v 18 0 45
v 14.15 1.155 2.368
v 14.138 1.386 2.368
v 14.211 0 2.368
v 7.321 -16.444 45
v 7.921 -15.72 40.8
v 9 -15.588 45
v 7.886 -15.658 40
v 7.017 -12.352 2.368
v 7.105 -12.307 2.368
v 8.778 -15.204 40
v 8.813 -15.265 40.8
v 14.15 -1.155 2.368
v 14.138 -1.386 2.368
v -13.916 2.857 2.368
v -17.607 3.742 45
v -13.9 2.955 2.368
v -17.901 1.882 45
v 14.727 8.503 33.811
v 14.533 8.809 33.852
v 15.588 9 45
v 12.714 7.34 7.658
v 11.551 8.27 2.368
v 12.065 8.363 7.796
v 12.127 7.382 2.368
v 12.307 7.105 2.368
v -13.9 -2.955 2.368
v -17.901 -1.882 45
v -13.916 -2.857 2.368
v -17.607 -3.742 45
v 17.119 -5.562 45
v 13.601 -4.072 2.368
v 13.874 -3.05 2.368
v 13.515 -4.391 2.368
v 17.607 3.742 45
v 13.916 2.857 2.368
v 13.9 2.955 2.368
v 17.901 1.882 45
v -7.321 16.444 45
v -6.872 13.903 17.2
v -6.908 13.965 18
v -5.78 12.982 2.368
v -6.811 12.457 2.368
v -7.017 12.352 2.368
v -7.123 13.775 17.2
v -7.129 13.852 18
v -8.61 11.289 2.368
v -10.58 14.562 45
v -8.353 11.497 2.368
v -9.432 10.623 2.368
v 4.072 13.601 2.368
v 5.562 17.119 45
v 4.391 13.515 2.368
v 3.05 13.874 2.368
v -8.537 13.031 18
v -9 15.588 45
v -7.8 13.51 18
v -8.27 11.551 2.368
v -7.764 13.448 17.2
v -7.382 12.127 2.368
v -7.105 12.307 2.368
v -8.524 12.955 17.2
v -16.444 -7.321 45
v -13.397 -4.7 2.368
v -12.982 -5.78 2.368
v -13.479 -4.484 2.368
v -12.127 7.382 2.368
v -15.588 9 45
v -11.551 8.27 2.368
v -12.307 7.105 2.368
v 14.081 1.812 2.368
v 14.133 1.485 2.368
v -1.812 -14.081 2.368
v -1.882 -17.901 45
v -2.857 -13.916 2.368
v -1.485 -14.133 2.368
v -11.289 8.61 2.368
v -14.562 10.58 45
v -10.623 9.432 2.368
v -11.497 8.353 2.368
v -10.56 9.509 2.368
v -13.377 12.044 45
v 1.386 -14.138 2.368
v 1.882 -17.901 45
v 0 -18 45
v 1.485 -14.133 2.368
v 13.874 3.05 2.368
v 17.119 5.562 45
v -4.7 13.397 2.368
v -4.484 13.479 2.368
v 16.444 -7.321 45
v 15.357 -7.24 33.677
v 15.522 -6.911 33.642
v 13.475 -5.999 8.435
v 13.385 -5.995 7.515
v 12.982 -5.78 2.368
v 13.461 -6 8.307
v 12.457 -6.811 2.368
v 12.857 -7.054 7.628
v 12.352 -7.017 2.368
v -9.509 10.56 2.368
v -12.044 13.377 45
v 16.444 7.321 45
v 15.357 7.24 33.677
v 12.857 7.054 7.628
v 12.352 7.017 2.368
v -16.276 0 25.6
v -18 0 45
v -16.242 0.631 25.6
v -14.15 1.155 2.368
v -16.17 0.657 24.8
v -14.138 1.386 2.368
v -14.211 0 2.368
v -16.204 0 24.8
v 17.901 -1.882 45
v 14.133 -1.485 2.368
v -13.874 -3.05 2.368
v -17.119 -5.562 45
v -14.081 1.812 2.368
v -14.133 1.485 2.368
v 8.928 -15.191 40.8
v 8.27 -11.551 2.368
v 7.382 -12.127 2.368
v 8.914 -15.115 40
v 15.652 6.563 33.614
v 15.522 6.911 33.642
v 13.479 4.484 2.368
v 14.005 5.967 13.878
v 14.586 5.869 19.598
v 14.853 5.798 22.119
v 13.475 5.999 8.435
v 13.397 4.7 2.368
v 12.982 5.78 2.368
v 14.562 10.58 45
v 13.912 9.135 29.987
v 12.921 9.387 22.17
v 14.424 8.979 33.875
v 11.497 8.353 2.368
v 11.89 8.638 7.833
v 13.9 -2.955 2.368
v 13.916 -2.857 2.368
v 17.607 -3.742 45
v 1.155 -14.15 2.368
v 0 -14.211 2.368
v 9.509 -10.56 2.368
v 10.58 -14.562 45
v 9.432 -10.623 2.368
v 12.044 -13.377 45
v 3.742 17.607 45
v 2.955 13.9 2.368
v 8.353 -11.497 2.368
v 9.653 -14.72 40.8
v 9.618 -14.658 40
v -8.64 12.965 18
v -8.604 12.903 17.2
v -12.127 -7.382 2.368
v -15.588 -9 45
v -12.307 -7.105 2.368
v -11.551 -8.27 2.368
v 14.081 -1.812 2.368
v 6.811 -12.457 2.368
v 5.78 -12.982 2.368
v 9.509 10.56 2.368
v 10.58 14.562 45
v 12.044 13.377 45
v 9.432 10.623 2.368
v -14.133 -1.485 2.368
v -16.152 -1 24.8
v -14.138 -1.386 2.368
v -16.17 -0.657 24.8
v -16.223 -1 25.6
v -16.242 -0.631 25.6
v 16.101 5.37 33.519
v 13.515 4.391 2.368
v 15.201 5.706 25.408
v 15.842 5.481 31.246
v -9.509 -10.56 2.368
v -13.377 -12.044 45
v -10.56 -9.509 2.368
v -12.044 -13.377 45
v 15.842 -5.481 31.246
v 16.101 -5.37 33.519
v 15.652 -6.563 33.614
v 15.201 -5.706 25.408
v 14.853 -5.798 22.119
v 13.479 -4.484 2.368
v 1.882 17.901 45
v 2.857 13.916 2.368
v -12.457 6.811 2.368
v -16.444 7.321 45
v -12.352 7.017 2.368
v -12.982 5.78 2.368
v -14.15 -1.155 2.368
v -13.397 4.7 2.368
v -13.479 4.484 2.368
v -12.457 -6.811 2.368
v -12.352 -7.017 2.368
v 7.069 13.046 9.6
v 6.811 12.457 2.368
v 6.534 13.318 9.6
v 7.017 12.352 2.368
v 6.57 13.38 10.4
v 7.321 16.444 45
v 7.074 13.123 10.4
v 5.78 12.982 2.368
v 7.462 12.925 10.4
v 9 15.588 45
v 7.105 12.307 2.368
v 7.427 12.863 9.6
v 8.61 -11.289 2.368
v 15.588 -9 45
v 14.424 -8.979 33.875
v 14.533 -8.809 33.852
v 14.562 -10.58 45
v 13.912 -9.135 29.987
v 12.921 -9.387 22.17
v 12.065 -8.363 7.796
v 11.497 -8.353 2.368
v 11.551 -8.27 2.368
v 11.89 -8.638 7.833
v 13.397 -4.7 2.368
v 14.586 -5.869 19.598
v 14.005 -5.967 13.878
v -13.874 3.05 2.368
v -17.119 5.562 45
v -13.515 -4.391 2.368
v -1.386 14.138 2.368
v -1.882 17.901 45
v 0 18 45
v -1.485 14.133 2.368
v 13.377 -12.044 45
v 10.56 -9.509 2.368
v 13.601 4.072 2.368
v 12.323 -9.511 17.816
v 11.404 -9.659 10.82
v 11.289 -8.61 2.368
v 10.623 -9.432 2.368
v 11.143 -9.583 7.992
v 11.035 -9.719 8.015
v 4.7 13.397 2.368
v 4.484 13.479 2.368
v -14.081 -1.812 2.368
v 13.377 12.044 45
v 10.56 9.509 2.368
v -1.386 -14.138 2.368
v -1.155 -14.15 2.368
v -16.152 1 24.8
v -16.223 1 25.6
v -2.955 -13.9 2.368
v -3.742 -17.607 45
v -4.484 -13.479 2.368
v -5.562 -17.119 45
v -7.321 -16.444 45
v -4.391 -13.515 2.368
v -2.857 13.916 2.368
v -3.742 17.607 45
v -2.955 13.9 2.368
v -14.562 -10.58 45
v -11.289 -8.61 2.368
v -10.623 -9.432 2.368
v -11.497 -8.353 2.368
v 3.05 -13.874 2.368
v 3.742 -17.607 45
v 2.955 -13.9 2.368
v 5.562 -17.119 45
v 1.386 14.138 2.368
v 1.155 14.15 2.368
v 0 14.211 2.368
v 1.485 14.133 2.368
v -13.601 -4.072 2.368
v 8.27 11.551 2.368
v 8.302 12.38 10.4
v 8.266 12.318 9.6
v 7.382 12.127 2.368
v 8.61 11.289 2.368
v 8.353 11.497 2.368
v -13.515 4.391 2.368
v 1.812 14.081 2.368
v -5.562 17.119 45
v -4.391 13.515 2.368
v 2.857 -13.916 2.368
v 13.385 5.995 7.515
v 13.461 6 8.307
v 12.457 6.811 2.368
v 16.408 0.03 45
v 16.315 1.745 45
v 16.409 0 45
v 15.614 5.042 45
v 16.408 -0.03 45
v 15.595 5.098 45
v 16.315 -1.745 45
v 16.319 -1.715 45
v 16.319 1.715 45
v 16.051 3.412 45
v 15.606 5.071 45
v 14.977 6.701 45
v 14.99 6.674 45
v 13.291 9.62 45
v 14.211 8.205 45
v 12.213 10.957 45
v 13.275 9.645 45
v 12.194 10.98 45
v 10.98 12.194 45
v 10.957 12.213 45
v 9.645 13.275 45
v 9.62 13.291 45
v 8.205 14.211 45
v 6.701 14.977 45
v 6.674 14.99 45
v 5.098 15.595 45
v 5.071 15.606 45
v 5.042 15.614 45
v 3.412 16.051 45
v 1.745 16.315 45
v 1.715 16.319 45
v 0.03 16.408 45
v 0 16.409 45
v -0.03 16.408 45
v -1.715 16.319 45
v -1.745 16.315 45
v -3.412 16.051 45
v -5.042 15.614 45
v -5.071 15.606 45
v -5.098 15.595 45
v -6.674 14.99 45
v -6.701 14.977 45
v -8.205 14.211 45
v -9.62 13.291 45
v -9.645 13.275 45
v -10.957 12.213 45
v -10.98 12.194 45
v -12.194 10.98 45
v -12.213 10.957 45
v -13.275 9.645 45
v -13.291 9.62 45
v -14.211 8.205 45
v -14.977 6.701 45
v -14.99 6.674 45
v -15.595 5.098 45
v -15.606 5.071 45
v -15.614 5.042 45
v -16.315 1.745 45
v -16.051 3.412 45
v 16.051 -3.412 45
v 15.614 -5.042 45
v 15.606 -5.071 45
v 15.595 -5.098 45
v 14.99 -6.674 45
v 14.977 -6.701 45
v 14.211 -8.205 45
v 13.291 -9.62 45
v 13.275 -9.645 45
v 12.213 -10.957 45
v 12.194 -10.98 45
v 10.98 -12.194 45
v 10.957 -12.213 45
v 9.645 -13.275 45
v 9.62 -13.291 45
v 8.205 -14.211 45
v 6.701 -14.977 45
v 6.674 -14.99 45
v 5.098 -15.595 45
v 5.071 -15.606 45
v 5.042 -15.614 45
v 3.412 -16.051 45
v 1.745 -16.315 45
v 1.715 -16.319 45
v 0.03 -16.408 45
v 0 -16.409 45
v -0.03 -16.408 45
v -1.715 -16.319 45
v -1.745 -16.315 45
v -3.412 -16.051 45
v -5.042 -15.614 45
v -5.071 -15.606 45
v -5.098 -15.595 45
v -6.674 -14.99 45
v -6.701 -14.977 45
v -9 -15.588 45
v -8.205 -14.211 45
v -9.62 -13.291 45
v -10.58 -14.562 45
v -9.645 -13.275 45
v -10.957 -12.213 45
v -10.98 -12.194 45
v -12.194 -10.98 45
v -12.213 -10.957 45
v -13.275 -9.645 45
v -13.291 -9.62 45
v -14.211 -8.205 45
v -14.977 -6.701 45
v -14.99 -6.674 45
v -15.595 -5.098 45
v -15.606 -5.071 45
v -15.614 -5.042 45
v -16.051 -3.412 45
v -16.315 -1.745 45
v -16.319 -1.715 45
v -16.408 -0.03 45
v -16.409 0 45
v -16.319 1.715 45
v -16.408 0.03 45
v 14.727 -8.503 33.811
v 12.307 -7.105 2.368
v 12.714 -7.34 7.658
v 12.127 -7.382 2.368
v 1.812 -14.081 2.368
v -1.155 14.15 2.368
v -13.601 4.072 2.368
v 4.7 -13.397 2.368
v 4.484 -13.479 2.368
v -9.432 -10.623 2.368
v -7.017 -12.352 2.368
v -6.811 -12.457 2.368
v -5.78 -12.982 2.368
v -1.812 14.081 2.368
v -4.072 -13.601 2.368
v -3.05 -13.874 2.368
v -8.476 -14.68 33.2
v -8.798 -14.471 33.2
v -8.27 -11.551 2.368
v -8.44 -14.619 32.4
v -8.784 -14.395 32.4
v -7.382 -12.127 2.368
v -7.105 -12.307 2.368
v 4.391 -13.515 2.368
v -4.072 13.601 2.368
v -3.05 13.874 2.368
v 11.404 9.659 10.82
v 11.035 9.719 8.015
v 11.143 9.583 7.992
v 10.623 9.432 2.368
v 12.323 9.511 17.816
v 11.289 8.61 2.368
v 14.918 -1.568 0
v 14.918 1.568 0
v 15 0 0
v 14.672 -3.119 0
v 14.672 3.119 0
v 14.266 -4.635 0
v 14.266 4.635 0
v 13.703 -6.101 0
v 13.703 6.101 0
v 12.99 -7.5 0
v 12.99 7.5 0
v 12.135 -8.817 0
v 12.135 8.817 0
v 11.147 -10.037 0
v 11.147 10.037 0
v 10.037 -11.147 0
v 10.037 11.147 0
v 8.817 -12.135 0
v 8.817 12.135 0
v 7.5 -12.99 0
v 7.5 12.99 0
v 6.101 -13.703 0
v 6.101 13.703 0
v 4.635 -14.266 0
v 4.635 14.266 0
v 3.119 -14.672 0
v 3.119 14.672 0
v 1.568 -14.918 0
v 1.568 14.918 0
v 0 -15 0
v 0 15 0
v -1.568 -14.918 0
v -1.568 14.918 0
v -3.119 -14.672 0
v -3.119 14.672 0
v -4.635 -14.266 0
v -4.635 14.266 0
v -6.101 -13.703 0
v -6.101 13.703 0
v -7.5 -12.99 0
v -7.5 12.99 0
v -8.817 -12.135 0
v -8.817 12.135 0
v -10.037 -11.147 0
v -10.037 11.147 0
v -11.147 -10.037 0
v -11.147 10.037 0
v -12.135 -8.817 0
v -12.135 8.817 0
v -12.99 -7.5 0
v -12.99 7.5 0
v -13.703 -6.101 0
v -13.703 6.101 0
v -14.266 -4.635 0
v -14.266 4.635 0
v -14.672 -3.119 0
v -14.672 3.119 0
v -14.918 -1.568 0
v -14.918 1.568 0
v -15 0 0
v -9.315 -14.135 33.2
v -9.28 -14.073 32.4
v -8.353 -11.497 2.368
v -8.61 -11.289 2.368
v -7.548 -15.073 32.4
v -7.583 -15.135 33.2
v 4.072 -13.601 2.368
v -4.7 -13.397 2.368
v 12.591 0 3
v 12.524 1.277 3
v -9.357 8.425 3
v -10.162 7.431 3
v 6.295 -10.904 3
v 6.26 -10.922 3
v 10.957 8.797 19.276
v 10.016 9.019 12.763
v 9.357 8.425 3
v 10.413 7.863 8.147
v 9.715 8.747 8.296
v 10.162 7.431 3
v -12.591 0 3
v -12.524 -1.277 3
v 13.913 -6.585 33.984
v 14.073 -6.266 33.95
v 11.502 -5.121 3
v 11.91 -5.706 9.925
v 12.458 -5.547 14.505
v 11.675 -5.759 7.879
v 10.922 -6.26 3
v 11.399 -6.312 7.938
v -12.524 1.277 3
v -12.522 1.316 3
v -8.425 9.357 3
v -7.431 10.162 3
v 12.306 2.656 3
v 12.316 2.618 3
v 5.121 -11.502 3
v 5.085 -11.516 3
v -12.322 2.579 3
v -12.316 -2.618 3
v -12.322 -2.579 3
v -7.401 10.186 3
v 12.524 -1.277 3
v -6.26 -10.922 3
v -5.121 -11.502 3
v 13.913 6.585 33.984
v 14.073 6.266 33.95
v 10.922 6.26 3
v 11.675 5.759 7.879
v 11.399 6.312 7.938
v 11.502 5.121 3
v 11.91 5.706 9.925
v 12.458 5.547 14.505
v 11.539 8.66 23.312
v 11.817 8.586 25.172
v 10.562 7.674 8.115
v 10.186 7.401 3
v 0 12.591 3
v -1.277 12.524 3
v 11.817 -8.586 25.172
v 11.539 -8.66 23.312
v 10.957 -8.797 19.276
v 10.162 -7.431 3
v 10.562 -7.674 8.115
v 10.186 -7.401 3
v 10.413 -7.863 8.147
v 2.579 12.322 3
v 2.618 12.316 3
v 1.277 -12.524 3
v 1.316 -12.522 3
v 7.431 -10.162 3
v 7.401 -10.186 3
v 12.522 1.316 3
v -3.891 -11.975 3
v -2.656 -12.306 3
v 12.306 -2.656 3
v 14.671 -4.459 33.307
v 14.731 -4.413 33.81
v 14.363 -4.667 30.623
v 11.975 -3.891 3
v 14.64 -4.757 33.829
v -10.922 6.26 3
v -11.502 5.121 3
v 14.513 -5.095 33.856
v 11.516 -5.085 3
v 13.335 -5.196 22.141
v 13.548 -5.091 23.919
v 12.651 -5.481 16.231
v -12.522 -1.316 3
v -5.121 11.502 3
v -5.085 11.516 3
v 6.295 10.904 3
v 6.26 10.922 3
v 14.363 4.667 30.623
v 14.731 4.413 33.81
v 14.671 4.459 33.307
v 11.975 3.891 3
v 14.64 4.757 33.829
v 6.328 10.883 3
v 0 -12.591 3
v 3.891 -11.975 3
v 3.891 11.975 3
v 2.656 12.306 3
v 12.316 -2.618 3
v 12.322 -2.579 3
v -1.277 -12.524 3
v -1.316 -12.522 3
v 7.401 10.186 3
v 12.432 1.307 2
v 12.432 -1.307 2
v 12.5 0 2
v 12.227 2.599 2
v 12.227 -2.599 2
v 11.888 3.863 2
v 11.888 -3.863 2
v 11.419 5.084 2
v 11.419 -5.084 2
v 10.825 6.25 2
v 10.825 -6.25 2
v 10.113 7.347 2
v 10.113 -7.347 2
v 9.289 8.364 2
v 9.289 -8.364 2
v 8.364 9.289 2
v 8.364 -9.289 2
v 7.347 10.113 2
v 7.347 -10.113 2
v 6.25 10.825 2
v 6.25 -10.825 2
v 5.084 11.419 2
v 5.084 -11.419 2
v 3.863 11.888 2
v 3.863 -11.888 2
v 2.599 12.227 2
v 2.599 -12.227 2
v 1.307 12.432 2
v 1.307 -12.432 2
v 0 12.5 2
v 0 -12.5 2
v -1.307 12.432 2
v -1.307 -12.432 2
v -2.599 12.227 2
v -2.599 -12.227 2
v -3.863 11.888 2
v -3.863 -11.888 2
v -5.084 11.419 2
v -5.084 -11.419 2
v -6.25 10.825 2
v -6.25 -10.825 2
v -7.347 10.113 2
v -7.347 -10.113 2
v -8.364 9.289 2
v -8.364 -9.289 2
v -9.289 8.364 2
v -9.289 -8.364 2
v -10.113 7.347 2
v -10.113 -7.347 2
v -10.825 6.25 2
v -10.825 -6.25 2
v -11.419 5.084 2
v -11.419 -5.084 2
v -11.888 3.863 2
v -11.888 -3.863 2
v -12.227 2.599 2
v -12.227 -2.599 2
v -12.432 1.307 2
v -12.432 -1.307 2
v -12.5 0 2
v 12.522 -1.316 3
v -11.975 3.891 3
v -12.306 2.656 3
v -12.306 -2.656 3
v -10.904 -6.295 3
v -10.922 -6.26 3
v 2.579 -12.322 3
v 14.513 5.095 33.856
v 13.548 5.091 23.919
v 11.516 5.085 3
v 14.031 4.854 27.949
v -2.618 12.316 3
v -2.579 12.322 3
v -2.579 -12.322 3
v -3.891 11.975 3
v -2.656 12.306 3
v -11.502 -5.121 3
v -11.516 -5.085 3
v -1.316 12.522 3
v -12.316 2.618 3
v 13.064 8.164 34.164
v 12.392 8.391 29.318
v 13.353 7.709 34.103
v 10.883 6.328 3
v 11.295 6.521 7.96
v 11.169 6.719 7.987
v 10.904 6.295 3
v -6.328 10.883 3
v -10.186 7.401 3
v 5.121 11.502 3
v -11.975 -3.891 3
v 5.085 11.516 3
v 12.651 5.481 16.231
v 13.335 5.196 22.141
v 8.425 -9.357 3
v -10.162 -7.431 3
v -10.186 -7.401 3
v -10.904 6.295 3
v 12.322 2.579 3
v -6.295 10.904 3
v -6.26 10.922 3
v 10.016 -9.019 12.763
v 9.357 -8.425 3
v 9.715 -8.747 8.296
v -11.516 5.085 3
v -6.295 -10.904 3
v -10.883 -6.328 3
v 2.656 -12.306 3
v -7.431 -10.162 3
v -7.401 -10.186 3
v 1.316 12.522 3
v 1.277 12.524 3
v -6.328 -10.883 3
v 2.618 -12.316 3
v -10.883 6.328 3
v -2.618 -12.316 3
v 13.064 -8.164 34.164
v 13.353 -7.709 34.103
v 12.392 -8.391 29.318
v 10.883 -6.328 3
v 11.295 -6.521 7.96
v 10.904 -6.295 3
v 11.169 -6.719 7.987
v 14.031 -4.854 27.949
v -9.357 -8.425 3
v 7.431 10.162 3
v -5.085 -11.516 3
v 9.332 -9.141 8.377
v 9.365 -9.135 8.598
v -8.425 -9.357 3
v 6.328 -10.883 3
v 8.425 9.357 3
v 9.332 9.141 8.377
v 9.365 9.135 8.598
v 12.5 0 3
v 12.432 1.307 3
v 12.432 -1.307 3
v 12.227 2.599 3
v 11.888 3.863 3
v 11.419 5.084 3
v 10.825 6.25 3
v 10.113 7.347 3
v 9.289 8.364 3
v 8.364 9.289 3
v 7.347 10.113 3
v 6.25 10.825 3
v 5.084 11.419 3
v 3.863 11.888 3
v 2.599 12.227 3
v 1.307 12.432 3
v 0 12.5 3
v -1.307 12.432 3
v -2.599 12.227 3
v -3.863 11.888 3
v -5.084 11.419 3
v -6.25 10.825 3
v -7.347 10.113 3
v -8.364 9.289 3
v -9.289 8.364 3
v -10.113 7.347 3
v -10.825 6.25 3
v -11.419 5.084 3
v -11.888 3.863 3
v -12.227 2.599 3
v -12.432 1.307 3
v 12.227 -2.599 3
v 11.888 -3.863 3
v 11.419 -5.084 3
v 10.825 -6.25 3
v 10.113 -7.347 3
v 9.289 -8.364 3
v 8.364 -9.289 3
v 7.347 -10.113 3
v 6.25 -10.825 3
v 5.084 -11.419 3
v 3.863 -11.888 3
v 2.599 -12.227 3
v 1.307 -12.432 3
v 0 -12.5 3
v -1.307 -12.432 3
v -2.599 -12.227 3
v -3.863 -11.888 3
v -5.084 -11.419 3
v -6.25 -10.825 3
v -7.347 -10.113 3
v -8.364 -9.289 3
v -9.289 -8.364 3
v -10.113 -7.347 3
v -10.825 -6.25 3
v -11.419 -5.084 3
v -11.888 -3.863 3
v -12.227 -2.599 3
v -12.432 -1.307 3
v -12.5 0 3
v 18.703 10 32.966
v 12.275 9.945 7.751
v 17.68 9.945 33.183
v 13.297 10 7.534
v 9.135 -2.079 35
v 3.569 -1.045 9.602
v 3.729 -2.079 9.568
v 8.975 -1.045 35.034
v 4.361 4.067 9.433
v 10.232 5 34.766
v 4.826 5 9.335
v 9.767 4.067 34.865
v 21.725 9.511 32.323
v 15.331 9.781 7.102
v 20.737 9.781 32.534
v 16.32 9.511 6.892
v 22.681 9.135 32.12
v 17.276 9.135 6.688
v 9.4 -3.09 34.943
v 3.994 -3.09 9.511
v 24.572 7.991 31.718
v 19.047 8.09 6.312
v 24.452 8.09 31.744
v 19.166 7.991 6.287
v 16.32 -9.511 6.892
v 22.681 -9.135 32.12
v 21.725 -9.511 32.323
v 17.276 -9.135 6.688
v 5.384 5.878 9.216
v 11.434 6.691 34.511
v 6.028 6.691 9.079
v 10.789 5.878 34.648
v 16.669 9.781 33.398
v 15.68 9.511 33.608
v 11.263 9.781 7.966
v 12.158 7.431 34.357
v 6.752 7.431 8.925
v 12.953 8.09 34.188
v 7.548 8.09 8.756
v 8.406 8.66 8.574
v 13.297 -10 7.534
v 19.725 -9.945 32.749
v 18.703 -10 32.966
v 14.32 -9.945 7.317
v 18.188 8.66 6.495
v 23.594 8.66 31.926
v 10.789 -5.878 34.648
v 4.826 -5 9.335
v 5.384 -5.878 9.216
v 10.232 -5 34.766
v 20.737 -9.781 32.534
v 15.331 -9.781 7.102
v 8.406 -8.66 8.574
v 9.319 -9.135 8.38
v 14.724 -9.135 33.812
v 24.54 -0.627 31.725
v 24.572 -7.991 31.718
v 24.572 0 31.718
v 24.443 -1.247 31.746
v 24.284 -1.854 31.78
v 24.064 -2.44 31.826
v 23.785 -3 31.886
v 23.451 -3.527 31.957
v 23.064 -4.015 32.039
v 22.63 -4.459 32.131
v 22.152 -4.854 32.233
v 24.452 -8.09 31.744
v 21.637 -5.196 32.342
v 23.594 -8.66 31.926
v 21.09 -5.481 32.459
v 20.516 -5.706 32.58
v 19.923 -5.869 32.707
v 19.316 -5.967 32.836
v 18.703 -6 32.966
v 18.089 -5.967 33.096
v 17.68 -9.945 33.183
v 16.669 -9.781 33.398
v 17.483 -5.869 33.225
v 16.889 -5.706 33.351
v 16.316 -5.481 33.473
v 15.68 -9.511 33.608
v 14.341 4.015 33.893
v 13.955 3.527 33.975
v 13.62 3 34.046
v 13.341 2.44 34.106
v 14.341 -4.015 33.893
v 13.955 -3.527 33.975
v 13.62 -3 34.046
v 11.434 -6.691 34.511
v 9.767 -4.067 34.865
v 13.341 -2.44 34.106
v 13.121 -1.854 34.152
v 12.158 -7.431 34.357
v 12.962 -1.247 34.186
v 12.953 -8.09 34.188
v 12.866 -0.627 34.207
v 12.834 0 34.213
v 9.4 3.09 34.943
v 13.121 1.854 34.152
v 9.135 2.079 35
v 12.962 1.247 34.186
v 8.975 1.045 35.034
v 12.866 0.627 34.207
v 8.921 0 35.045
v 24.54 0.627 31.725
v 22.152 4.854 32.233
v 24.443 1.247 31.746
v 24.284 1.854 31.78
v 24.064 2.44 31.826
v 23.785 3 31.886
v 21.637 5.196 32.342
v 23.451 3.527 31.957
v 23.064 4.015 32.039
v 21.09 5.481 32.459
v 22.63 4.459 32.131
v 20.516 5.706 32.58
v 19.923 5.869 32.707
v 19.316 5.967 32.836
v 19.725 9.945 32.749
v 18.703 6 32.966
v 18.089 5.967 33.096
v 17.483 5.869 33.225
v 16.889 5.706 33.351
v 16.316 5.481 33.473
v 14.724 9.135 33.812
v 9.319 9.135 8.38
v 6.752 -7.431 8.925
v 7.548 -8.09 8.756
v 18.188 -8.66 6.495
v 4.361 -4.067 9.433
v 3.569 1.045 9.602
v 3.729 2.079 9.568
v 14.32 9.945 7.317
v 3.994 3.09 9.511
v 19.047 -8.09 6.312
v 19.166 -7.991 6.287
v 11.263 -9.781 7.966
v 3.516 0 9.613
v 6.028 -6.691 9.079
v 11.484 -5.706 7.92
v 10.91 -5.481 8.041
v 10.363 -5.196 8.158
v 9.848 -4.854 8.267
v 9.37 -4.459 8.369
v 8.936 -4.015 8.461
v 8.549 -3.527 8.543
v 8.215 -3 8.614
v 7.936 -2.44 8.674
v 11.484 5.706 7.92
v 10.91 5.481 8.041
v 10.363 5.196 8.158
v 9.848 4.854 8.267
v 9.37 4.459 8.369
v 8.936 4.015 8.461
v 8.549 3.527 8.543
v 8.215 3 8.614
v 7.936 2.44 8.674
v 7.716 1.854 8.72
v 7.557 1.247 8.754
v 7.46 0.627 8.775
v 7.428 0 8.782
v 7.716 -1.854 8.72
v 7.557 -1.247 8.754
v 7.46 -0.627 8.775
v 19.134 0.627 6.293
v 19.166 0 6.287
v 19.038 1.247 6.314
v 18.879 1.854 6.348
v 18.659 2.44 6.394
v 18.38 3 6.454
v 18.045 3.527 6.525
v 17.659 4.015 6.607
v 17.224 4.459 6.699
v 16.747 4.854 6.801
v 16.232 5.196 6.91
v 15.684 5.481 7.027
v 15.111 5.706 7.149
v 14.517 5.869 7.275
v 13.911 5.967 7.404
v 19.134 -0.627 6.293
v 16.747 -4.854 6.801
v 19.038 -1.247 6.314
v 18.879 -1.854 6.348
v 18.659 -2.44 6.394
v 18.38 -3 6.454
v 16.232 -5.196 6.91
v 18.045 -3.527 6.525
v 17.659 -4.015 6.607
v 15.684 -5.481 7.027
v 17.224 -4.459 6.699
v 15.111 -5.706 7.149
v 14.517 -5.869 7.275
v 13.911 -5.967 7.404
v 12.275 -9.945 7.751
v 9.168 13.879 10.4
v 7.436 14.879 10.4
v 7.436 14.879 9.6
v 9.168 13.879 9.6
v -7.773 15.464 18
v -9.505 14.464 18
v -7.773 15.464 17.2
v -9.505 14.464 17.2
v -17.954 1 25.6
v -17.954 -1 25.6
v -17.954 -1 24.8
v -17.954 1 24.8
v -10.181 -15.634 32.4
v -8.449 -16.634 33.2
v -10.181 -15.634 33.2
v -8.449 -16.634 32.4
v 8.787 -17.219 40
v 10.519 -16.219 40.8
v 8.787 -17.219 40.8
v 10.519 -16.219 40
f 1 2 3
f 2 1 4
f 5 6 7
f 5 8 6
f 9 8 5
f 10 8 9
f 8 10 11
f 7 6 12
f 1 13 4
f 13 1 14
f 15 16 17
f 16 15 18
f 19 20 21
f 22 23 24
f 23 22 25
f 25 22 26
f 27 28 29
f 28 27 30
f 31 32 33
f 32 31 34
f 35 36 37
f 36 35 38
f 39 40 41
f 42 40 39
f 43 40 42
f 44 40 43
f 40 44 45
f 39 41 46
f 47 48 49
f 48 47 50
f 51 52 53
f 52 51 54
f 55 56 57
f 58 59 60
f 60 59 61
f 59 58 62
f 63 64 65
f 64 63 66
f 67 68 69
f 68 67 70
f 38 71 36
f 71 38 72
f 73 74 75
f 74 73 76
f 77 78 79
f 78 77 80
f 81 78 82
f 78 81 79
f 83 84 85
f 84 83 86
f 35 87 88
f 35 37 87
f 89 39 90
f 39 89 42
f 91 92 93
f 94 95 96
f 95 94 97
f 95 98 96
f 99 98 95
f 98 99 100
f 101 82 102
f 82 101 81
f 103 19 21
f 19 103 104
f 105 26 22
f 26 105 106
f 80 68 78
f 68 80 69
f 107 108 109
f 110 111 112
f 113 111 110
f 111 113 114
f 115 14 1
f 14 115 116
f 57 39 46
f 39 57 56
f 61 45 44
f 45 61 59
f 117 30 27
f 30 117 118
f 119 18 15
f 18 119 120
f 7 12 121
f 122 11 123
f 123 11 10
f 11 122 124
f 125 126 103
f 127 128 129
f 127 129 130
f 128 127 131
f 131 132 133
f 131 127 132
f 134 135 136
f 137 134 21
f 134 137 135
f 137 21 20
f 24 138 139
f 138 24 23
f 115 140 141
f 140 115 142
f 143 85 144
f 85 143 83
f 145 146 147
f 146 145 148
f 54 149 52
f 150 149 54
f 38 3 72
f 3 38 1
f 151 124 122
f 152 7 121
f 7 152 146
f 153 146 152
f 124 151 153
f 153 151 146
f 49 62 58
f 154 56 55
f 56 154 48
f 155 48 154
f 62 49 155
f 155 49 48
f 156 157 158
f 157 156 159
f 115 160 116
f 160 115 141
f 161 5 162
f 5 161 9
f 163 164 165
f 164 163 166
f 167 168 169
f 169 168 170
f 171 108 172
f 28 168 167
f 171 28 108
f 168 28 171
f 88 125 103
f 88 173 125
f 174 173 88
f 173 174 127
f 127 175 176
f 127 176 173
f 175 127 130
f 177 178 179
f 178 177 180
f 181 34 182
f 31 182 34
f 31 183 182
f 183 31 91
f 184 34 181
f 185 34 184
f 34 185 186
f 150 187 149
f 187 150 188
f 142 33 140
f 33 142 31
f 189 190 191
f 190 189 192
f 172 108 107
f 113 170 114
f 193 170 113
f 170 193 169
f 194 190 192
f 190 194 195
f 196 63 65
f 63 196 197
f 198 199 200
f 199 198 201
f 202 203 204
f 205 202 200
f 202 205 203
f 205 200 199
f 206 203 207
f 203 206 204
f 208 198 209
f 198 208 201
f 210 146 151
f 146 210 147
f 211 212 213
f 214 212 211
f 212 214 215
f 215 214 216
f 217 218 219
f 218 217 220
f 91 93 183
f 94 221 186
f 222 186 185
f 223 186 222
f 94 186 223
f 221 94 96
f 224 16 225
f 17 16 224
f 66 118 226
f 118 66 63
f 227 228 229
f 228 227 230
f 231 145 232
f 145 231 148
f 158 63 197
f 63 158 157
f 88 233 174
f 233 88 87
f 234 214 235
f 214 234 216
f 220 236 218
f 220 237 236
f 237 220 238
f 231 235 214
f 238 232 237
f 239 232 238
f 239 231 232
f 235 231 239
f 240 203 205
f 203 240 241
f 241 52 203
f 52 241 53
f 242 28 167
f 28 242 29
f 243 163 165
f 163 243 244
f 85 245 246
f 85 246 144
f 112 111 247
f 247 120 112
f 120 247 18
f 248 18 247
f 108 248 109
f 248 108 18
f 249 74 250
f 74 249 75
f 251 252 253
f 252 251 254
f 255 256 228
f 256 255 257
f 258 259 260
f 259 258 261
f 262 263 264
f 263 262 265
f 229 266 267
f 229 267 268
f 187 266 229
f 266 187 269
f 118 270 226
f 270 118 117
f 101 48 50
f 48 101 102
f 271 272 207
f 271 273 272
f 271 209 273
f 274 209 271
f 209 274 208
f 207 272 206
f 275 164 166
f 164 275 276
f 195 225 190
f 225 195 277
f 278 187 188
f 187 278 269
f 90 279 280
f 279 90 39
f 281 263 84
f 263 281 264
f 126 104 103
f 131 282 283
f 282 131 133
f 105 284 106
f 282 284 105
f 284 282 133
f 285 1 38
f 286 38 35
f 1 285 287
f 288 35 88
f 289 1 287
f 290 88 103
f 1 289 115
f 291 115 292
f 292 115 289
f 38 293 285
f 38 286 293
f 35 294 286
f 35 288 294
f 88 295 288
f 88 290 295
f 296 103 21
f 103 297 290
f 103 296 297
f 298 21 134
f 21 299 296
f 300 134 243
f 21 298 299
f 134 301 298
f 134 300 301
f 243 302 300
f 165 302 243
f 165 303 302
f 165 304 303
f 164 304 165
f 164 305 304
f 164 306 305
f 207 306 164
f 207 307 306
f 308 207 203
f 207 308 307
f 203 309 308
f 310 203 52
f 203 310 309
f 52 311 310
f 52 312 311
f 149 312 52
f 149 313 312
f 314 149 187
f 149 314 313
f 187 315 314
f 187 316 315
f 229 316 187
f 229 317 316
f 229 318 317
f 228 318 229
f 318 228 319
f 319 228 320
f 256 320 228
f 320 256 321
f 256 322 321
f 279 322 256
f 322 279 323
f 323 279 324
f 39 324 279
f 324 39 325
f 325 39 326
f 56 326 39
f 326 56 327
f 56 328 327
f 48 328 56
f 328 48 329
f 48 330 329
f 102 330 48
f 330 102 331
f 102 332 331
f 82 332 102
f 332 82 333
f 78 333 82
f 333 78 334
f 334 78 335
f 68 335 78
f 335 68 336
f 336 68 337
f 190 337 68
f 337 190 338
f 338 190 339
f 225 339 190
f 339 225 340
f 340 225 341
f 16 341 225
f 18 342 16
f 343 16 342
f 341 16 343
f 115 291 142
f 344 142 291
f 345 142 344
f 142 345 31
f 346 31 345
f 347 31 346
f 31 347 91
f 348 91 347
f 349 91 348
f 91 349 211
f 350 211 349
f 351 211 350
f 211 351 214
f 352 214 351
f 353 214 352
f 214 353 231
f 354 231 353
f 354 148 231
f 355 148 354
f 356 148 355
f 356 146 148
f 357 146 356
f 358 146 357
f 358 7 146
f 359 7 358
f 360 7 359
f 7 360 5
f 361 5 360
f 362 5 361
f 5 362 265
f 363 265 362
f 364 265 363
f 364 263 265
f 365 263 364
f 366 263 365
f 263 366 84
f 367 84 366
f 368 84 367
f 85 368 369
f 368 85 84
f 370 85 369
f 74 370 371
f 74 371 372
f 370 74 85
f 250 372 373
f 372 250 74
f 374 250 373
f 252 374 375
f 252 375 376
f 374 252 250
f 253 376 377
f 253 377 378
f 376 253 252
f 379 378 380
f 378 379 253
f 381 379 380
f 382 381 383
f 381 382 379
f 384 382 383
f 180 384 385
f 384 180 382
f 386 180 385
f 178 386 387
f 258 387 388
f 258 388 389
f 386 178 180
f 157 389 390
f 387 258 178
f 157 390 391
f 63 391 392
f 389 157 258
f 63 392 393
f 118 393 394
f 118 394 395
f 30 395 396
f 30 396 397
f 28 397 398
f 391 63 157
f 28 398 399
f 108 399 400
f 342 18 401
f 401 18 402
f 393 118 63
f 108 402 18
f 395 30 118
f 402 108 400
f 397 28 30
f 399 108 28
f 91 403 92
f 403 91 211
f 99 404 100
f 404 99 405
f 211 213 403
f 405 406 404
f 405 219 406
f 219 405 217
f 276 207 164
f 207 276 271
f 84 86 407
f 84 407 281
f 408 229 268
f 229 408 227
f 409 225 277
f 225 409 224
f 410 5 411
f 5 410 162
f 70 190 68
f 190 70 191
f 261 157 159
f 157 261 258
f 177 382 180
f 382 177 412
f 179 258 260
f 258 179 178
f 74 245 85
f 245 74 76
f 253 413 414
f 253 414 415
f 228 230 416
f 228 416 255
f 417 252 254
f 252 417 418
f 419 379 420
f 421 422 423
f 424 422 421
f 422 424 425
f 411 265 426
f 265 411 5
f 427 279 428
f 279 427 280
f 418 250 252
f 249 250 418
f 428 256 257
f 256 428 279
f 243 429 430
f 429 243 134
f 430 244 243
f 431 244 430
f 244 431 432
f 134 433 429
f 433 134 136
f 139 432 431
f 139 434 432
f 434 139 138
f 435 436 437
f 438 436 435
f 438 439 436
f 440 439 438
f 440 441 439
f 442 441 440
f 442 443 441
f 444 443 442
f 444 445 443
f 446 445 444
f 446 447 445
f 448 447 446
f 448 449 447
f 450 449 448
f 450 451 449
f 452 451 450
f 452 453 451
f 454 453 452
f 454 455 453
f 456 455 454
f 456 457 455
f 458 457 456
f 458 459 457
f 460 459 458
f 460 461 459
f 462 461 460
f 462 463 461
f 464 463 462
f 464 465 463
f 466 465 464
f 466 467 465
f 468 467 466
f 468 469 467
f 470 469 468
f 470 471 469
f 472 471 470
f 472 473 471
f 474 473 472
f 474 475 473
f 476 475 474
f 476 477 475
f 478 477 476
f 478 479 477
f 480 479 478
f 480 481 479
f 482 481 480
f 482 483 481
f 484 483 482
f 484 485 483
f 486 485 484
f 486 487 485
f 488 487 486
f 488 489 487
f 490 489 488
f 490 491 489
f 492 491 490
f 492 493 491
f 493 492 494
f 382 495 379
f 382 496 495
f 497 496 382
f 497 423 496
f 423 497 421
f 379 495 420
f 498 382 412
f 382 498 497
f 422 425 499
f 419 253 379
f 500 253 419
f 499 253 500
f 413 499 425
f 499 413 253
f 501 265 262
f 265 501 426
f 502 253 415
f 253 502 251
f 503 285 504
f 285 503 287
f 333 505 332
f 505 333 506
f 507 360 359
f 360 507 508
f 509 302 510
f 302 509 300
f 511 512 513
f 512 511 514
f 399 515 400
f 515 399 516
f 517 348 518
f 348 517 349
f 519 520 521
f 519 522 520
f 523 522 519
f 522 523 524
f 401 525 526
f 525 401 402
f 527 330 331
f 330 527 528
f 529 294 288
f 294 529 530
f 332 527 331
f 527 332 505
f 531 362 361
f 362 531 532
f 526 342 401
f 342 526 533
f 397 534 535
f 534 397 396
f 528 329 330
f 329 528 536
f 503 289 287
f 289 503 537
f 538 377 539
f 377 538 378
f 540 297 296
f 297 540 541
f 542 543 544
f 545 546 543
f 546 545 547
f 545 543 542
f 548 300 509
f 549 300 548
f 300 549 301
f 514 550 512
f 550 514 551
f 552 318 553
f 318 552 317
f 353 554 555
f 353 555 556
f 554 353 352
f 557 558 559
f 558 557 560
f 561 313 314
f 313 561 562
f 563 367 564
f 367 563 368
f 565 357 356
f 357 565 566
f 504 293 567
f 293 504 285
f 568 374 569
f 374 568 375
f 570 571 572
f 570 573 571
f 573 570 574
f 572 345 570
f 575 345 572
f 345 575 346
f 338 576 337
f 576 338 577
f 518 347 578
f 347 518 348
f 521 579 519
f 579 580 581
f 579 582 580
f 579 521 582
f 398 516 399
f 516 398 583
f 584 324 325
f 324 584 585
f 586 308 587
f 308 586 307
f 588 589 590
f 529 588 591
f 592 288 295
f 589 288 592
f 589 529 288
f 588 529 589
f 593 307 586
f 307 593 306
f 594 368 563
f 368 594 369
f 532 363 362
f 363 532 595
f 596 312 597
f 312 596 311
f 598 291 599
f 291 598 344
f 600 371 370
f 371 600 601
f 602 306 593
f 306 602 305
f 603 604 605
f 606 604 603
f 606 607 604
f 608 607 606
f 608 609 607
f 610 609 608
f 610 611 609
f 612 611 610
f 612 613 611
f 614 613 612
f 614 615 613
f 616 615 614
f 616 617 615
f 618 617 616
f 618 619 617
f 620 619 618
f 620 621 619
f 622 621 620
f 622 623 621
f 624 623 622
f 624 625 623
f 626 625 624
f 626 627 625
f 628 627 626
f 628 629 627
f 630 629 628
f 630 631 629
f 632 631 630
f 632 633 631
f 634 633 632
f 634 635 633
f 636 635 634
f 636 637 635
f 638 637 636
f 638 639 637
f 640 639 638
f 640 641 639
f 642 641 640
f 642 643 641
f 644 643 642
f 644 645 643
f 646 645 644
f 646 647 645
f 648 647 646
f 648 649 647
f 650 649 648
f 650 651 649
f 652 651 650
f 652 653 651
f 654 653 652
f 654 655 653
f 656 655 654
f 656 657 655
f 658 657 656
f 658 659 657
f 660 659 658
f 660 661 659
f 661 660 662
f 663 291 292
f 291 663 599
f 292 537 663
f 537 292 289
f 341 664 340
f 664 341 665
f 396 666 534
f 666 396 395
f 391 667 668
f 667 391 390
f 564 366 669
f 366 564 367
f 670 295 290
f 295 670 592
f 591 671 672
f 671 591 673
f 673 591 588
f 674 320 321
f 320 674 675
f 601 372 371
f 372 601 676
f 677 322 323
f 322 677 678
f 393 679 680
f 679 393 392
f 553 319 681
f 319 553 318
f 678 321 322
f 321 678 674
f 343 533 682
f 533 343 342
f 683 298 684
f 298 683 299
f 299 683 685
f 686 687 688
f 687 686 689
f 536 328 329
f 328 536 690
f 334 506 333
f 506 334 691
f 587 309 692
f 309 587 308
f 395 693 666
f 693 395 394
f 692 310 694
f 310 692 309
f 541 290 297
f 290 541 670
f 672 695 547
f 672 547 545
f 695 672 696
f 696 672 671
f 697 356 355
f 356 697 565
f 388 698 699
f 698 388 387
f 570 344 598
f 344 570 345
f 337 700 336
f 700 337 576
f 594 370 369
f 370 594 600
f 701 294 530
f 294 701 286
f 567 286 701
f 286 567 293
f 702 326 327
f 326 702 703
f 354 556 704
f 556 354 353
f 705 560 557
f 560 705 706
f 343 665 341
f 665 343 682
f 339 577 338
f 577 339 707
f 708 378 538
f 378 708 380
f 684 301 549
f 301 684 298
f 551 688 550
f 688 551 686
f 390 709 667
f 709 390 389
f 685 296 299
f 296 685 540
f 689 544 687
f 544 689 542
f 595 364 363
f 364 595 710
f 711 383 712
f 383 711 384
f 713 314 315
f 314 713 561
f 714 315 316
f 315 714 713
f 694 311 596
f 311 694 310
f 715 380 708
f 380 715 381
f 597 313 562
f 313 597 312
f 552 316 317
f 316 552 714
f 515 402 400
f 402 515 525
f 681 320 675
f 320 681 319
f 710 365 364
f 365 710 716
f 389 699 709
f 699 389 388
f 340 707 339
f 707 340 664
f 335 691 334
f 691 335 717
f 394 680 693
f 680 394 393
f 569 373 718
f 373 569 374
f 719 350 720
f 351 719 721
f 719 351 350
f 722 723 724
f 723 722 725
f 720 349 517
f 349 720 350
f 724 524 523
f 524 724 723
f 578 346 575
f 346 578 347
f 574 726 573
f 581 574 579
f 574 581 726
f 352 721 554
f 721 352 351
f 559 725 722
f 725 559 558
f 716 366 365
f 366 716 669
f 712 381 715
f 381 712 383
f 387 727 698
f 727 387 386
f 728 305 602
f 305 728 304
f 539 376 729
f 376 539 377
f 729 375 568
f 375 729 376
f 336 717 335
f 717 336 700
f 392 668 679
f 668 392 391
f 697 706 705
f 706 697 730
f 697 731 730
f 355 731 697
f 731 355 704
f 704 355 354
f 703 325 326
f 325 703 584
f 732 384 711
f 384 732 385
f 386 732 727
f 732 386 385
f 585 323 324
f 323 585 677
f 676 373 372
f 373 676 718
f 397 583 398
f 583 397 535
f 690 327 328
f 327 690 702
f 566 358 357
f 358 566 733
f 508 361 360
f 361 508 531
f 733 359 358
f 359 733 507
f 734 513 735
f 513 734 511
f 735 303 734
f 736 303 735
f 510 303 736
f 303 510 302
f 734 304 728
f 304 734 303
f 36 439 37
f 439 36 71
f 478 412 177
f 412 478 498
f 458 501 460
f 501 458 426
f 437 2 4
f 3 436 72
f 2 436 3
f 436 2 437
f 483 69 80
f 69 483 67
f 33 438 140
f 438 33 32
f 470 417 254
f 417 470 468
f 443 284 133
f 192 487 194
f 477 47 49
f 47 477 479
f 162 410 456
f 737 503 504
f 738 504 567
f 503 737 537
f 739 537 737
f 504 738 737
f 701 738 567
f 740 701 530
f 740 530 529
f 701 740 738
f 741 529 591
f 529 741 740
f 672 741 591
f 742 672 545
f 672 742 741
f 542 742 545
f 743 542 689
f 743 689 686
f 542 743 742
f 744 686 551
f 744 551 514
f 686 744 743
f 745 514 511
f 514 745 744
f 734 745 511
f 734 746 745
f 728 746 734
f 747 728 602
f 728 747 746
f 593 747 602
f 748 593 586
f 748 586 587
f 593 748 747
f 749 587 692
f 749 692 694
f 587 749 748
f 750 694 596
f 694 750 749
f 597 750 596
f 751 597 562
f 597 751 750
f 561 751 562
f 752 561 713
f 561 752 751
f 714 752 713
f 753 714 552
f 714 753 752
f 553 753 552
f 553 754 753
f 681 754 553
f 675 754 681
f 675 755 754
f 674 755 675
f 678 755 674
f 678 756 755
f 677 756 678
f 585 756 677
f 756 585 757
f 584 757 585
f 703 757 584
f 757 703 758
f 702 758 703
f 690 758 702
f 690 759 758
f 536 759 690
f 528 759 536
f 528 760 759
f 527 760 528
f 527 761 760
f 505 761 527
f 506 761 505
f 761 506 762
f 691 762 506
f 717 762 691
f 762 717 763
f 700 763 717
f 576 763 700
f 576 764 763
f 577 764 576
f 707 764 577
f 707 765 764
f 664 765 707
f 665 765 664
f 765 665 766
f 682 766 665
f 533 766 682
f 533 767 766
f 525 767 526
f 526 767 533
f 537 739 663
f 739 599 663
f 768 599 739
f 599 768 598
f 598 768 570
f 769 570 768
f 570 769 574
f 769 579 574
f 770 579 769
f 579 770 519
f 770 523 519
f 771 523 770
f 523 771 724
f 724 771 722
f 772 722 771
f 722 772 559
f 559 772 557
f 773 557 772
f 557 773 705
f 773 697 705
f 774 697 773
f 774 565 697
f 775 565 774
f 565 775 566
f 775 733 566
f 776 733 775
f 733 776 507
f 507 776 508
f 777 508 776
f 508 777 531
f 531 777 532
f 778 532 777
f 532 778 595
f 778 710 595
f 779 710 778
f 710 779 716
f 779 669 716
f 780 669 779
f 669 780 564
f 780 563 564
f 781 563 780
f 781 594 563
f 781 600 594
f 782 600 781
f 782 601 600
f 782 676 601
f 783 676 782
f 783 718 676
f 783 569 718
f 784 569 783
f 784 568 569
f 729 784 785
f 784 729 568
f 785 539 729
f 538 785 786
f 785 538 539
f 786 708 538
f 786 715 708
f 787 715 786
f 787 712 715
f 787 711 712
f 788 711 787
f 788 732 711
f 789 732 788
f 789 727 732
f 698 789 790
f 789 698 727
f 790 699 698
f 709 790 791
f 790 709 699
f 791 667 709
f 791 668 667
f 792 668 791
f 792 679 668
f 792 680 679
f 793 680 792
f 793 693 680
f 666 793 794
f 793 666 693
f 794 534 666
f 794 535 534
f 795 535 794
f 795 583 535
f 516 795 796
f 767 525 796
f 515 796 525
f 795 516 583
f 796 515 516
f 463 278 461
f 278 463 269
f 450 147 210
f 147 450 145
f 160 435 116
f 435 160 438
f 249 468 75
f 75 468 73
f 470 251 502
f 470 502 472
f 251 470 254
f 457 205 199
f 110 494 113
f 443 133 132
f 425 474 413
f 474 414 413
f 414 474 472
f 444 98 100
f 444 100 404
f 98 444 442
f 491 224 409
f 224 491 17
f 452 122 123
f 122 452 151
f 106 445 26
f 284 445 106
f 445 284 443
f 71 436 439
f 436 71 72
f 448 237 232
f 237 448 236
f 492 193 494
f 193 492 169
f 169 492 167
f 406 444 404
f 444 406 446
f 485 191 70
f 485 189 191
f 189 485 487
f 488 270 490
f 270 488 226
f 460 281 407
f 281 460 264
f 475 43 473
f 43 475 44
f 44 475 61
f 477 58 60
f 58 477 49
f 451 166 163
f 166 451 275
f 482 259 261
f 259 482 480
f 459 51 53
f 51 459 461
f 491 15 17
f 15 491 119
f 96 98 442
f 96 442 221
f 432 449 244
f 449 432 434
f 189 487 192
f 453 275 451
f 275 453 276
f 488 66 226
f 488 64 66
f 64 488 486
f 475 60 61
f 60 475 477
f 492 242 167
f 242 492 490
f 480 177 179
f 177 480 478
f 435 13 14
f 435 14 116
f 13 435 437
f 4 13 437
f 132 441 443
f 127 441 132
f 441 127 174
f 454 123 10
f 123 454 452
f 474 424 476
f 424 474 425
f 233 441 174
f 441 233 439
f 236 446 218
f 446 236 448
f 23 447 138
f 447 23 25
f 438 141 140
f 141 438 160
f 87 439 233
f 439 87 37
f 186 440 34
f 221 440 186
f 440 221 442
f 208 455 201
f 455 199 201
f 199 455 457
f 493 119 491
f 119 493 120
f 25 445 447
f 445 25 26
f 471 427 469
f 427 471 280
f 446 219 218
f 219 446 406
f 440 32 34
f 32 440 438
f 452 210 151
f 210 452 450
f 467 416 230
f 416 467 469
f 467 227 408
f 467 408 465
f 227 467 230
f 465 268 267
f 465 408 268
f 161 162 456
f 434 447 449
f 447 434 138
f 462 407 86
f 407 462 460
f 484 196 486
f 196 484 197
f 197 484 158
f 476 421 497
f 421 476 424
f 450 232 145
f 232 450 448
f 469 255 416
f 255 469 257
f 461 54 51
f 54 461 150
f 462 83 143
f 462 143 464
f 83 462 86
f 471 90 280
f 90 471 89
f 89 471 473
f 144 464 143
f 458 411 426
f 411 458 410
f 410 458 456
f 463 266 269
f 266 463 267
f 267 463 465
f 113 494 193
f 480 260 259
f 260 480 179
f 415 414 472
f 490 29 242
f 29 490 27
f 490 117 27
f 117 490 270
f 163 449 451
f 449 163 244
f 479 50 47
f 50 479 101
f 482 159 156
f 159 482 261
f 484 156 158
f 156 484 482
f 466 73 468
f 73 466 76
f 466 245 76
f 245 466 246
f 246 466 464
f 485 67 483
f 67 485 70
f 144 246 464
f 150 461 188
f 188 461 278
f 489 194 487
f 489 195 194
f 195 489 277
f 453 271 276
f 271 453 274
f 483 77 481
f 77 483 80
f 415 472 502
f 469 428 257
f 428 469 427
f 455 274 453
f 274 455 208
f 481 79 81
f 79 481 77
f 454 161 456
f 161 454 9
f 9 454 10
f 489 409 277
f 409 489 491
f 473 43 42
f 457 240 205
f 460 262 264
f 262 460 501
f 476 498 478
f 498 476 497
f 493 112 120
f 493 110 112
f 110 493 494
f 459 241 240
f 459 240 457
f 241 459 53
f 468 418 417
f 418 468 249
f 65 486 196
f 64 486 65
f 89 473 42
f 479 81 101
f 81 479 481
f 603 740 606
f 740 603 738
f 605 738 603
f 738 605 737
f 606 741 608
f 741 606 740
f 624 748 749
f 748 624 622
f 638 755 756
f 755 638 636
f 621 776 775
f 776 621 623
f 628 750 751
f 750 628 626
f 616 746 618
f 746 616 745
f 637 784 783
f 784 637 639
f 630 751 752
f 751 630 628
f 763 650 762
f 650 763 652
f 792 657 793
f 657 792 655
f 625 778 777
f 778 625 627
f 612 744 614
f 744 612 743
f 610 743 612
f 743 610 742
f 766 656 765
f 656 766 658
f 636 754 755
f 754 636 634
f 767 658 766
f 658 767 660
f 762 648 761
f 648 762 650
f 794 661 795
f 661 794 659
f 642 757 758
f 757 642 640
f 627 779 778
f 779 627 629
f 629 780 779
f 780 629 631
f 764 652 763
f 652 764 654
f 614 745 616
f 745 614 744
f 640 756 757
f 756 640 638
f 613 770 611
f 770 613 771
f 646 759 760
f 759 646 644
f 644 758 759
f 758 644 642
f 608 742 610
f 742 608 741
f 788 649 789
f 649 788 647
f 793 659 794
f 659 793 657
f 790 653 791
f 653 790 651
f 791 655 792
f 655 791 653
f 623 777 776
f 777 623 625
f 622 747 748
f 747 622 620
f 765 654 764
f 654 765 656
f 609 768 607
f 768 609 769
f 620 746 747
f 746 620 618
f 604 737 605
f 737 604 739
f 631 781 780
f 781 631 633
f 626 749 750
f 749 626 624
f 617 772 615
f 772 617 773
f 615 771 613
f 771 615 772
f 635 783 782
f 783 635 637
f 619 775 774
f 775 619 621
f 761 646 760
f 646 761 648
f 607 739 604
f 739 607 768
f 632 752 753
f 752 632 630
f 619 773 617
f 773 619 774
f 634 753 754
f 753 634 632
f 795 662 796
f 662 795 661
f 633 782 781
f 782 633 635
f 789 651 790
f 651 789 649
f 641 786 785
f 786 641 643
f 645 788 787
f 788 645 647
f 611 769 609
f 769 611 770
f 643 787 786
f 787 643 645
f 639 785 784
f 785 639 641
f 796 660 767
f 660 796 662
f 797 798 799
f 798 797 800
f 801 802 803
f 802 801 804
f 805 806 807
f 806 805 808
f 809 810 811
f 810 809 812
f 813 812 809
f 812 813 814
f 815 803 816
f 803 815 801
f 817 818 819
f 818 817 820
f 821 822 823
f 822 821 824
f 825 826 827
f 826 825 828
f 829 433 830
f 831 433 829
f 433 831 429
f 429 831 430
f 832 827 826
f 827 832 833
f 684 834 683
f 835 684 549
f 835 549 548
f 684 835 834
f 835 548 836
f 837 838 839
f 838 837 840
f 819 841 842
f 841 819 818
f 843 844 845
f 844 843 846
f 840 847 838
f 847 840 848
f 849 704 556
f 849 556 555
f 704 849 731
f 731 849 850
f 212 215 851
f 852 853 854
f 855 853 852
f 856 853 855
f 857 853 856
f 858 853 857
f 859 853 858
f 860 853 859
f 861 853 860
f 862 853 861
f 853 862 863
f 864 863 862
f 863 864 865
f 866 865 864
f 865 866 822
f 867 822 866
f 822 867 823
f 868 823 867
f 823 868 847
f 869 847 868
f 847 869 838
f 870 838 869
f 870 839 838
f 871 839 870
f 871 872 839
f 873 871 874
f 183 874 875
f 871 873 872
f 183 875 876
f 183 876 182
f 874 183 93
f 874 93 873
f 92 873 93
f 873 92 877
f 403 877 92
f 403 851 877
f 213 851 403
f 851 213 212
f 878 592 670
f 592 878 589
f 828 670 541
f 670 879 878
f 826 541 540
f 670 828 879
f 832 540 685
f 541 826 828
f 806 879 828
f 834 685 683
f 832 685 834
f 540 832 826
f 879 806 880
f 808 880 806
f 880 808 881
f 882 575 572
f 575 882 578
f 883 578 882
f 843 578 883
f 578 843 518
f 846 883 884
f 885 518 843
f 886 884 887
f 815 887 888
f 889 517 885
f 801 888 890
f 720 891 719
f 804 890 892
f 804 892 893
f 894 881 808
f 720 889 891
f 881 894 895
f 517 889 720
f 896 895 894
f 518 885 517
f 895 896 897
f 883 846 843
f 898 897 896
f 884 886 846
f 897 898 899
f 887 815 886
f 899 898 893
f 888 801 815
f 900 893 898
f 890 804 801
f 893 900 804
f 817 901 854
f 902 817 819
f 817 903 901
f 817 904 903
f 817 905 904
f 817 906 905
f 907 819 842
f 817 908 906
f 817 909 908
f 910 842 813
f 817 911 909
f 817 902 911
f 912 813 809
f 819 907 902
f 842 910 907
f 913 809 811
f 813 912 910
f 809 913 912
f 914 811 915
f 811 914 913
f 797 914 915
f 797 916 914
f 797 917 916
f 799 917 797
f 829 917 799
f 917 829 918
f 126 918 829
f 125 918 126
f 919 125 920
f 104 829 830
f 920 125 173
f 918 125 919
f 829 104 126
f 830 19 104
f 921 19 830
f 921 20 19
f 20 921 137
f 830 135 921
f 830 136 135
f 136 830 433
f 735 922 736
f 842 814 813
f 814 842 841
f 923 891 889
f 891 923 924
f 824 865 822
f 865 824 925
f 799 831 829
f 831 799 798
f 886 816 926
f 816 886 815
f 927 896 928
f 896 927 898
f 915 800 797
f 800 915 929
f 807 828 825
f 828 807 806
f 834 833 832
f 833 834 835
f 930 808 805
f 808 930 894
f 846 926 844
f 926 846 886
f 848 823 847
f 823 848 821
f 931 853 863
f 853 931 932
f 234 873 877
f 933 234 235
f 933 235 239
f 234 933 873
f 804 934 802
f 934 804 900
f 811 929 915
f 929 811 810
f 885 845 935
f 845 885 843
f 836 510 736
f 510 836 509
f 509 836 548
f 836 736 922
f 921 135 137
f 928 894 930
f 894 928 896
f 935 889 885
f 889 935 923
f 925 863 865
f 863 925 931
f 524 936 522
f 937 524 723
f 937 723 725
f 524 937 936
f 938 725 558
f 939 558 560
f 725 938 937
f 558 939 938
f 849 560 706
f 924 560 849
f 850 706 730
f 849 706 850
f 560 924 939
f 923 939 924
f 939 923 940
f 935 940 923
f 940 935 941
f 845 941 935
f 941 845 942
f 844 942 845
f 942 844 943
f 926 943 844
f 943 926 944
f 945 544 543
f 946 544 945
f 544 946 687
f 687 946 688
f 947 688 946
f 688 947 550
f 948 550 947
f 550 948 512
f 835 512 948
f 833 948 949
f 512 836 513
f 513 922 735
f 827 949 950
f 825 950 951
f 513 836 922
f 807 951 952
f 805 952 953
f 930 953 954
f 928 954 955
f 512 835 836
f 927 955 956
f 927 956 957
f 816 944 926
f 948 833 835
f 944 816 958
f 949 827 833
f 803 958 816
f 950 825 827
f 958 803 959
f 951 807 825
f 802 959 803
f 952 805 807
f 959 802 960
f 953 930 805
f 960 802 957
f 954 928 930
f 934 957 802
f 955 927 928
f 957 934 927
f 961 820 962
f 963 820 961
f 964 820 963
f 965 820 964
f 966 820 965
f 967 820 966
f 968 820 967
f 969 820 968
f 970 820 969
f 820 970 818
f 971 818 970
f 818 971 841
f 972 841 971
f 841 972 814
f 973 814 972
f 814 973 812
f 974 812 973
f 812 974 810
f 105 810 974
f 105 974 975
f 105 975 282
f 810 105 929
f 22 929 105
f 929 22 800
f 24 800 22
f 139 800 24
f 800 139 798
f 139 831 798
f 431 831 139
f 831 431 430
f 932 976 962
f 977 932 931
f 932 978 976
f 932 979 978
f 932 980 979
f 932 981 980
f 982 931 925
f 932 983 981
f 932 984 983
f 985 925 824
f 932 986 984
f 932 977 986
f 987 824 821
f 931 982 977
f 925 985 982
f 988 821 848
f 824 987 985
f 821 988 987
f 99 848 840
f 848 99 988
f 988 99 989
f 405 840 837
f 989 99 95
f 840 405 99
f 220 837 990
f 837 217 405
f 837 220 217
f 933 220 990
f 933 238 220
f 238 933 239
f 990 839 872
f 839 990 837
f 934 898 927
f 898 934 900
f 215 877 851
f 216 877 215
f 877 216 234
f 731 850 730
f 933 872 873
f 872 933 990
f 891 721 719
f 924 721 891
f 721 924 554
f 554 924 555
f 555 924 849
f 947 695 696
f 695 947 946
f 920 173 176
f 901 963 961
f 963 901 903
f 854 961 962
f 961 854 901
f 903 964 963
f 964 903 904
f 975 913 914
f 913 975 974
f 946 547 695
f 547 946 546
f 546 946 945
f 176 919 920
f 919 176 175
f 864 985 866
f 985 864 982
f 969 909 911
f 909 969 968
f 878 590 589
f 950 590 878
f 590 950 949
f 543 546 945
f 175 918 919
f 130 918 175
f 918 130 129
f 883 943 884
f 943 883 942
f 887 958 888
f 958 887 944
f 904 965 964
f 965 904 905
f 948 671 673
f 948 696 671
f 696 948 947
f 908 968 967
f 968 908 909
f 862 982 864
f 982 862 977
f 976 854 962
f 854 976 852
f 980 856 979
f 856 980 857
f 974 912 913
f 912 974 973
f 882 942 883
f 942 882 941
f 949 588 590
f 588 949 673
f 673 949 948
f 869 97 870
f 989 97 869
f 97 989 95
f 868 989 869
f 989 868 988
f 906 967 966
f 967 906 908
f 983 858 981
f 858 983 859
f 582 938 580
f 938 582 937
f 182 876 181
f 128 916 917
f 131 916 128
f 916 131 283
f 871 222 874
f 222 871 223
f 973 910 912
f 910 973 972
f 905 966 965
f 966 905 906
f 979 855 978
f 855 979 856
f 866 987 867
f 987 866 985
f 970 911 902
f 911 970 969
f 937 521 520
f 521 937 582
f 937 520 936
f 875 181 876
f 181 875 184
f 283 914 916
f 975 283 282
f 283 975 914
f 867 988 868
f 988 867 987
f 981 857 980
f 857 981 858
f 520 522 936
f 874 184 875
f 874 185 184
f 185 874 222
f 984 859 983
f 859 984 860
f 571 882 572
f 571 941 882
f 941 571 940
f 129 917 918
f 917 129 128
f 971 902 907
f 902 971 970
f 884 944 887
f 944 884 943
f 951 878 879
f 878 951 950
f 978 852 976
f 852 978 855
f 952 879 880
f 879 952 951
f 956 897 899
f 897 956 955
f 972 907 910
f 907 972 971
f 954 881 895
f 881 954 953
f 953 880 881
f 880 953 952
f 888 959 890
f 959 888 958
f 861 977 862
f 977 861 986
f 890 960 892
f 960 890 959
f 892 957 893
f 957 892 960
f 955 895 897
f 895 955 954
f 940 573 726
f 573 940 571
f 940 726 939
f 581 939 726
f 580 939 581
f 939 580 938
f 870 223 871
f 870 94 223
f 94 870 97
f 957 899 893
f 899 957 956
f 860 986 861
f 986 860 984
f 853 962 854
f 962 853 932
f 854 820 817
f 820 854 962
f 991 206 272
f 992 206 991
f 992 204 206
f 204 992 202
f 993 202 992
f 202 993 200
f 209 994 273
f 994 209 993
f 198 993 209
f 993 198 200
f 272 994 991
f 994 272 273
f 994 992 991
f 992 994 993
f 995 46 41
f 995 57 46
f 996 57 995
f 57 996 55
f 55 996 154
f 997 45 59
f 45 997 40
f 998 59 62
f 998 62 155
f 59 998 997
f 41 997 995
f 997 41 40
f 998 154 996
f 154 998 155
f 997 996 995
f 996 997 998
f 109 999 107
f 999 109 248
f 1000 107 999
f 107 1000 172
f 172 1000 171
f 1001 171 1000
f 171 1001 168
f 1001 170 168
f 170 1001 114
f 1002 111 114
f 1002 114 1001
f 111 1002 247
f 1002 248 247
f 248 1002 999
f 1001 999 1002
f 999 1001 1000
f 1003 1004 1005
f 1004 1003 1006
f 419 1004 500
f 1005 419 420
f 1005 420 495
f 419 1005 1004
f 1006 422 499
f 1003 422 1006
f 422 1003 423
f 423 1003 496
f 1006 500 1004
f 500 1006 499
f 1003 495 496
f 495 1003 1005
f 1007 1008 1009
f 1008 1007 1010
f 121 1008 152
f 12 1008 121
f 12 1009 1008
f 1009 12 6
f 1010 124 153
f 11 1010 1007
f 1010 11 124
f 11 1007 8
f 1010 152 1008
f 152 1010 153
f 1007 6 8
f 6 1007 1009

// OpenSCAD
// ==============================
// 30ML量杯模型
// ==============================
// 参数定义（单位：毫米）
$fn = 60;           // 圆形精度

// 杯体参数
bottom_d = 28;      // 底部直径
top_d = 36;         // 顶部直径（外扩）
cup_h = 45;         // 杯体高度
wall = 1.5;         // 壁厚
base_h = 2;         // 底部厚度

// 把手参数
handle_r = 8;       // 把手弯曲半径
handle_thick = 4;   // 把手粗细
handle_h = 26;      // 把手高度
handle_tilt = 12;   // 把手向外倾斜角度

// 刻度线参数
mark_count = 5;     // 刻度数量（每10ml一条）
mark_w = 2;         // 刻度线宽度
mark_d = 0.5;       // 刻度线深度

// ==============================
// 杯身主体模块
// ==============================
module cup_body() {
    difference() {
        // 外壳 - 从底部到顶部逐渐扩大
        cylinder(d1 = bottom_d, d2 = top_d, h = cup_h);
        
        // 内腔 - 挖空
        translate([0, 0, base_h])
            cylinder(
                d1 = bottom_d - 2 * wall, 
                d2 = top_d - 2 * wall, 
                h = cup_h - base_h + 1
            );
    }
}

// ==============================
// 底座模块 - 增加稳定性
// ==============================
module cup_base() {
    difference() {
        cylinder(d1 = bottom_d + 2, d2 = bottom_d, h = 3);
        translate([0, 0, -0.1])
            cylinder(d = bottom_d - 2 * wall, h = 3.2);
    }
}

// ==============================
// 把手模块 - C形小把手
// ==============================
module handle() {
    // 计算杯体侧面位置
    side_pos = (bottom_d + top_d) / 4;  // 杯体侧面平均半径
    
    translate([side_pos, 0, cup_h * 0.45])
    rotate([0, handle_tilt, 0]) {
        difference() {
            // 外圆环
            cylinder(r = handle_r + handle_thick / 2, h = handle_h, center = true);
            // 内圆环
            cylinder(r = handle_r - handle_thick / 2, h = handle_h + 1, center = true);
            // 切掉一半，形成C形
            translate([handle_r + 10, 0, 0])
                cube([20 + handle_thick, 20 + handle_thick, handle_h + 2], center = true);
        }
    }
}

// ==============================
// 刻度线模块
// ==============================
module graduation_marks() {
    for (i = [1 : mark_count]) {
        // 计算每条刻度的高度位置
        z_pos = base_h + (cup_h - base_h - 5) * (i / mark_count);
        // 计算该高度的半径（锥形杯壁）
        r_pos = (bottom_d / 2) + (top_d - bottom_d) / 2 * (z_pos / cup_h);
        
        translate([0, 0, z_pos])
        rotate([0, 0, i * 60])  // 交替角度避免重叠
            translate([r_pos - mark_d / 2, -mark_w / 2, 0])
                cube([mark_d + wall, mark_w, 0.8]);
    }
}

// ==============================
// 主组装
// ==============================
module measuring_cup_30ml() {
    union() {
        cup_body();
        cup_base();
        handle();
        graduation_marks();
    }
}

// 渲染模型
measuring_cup_30ml();

// ==============================
// 可选：打印时取消注释下方代码，将模型平放在底面
// ==============================
// translate([0, 0, 0]) measuring_cup_30ml();
